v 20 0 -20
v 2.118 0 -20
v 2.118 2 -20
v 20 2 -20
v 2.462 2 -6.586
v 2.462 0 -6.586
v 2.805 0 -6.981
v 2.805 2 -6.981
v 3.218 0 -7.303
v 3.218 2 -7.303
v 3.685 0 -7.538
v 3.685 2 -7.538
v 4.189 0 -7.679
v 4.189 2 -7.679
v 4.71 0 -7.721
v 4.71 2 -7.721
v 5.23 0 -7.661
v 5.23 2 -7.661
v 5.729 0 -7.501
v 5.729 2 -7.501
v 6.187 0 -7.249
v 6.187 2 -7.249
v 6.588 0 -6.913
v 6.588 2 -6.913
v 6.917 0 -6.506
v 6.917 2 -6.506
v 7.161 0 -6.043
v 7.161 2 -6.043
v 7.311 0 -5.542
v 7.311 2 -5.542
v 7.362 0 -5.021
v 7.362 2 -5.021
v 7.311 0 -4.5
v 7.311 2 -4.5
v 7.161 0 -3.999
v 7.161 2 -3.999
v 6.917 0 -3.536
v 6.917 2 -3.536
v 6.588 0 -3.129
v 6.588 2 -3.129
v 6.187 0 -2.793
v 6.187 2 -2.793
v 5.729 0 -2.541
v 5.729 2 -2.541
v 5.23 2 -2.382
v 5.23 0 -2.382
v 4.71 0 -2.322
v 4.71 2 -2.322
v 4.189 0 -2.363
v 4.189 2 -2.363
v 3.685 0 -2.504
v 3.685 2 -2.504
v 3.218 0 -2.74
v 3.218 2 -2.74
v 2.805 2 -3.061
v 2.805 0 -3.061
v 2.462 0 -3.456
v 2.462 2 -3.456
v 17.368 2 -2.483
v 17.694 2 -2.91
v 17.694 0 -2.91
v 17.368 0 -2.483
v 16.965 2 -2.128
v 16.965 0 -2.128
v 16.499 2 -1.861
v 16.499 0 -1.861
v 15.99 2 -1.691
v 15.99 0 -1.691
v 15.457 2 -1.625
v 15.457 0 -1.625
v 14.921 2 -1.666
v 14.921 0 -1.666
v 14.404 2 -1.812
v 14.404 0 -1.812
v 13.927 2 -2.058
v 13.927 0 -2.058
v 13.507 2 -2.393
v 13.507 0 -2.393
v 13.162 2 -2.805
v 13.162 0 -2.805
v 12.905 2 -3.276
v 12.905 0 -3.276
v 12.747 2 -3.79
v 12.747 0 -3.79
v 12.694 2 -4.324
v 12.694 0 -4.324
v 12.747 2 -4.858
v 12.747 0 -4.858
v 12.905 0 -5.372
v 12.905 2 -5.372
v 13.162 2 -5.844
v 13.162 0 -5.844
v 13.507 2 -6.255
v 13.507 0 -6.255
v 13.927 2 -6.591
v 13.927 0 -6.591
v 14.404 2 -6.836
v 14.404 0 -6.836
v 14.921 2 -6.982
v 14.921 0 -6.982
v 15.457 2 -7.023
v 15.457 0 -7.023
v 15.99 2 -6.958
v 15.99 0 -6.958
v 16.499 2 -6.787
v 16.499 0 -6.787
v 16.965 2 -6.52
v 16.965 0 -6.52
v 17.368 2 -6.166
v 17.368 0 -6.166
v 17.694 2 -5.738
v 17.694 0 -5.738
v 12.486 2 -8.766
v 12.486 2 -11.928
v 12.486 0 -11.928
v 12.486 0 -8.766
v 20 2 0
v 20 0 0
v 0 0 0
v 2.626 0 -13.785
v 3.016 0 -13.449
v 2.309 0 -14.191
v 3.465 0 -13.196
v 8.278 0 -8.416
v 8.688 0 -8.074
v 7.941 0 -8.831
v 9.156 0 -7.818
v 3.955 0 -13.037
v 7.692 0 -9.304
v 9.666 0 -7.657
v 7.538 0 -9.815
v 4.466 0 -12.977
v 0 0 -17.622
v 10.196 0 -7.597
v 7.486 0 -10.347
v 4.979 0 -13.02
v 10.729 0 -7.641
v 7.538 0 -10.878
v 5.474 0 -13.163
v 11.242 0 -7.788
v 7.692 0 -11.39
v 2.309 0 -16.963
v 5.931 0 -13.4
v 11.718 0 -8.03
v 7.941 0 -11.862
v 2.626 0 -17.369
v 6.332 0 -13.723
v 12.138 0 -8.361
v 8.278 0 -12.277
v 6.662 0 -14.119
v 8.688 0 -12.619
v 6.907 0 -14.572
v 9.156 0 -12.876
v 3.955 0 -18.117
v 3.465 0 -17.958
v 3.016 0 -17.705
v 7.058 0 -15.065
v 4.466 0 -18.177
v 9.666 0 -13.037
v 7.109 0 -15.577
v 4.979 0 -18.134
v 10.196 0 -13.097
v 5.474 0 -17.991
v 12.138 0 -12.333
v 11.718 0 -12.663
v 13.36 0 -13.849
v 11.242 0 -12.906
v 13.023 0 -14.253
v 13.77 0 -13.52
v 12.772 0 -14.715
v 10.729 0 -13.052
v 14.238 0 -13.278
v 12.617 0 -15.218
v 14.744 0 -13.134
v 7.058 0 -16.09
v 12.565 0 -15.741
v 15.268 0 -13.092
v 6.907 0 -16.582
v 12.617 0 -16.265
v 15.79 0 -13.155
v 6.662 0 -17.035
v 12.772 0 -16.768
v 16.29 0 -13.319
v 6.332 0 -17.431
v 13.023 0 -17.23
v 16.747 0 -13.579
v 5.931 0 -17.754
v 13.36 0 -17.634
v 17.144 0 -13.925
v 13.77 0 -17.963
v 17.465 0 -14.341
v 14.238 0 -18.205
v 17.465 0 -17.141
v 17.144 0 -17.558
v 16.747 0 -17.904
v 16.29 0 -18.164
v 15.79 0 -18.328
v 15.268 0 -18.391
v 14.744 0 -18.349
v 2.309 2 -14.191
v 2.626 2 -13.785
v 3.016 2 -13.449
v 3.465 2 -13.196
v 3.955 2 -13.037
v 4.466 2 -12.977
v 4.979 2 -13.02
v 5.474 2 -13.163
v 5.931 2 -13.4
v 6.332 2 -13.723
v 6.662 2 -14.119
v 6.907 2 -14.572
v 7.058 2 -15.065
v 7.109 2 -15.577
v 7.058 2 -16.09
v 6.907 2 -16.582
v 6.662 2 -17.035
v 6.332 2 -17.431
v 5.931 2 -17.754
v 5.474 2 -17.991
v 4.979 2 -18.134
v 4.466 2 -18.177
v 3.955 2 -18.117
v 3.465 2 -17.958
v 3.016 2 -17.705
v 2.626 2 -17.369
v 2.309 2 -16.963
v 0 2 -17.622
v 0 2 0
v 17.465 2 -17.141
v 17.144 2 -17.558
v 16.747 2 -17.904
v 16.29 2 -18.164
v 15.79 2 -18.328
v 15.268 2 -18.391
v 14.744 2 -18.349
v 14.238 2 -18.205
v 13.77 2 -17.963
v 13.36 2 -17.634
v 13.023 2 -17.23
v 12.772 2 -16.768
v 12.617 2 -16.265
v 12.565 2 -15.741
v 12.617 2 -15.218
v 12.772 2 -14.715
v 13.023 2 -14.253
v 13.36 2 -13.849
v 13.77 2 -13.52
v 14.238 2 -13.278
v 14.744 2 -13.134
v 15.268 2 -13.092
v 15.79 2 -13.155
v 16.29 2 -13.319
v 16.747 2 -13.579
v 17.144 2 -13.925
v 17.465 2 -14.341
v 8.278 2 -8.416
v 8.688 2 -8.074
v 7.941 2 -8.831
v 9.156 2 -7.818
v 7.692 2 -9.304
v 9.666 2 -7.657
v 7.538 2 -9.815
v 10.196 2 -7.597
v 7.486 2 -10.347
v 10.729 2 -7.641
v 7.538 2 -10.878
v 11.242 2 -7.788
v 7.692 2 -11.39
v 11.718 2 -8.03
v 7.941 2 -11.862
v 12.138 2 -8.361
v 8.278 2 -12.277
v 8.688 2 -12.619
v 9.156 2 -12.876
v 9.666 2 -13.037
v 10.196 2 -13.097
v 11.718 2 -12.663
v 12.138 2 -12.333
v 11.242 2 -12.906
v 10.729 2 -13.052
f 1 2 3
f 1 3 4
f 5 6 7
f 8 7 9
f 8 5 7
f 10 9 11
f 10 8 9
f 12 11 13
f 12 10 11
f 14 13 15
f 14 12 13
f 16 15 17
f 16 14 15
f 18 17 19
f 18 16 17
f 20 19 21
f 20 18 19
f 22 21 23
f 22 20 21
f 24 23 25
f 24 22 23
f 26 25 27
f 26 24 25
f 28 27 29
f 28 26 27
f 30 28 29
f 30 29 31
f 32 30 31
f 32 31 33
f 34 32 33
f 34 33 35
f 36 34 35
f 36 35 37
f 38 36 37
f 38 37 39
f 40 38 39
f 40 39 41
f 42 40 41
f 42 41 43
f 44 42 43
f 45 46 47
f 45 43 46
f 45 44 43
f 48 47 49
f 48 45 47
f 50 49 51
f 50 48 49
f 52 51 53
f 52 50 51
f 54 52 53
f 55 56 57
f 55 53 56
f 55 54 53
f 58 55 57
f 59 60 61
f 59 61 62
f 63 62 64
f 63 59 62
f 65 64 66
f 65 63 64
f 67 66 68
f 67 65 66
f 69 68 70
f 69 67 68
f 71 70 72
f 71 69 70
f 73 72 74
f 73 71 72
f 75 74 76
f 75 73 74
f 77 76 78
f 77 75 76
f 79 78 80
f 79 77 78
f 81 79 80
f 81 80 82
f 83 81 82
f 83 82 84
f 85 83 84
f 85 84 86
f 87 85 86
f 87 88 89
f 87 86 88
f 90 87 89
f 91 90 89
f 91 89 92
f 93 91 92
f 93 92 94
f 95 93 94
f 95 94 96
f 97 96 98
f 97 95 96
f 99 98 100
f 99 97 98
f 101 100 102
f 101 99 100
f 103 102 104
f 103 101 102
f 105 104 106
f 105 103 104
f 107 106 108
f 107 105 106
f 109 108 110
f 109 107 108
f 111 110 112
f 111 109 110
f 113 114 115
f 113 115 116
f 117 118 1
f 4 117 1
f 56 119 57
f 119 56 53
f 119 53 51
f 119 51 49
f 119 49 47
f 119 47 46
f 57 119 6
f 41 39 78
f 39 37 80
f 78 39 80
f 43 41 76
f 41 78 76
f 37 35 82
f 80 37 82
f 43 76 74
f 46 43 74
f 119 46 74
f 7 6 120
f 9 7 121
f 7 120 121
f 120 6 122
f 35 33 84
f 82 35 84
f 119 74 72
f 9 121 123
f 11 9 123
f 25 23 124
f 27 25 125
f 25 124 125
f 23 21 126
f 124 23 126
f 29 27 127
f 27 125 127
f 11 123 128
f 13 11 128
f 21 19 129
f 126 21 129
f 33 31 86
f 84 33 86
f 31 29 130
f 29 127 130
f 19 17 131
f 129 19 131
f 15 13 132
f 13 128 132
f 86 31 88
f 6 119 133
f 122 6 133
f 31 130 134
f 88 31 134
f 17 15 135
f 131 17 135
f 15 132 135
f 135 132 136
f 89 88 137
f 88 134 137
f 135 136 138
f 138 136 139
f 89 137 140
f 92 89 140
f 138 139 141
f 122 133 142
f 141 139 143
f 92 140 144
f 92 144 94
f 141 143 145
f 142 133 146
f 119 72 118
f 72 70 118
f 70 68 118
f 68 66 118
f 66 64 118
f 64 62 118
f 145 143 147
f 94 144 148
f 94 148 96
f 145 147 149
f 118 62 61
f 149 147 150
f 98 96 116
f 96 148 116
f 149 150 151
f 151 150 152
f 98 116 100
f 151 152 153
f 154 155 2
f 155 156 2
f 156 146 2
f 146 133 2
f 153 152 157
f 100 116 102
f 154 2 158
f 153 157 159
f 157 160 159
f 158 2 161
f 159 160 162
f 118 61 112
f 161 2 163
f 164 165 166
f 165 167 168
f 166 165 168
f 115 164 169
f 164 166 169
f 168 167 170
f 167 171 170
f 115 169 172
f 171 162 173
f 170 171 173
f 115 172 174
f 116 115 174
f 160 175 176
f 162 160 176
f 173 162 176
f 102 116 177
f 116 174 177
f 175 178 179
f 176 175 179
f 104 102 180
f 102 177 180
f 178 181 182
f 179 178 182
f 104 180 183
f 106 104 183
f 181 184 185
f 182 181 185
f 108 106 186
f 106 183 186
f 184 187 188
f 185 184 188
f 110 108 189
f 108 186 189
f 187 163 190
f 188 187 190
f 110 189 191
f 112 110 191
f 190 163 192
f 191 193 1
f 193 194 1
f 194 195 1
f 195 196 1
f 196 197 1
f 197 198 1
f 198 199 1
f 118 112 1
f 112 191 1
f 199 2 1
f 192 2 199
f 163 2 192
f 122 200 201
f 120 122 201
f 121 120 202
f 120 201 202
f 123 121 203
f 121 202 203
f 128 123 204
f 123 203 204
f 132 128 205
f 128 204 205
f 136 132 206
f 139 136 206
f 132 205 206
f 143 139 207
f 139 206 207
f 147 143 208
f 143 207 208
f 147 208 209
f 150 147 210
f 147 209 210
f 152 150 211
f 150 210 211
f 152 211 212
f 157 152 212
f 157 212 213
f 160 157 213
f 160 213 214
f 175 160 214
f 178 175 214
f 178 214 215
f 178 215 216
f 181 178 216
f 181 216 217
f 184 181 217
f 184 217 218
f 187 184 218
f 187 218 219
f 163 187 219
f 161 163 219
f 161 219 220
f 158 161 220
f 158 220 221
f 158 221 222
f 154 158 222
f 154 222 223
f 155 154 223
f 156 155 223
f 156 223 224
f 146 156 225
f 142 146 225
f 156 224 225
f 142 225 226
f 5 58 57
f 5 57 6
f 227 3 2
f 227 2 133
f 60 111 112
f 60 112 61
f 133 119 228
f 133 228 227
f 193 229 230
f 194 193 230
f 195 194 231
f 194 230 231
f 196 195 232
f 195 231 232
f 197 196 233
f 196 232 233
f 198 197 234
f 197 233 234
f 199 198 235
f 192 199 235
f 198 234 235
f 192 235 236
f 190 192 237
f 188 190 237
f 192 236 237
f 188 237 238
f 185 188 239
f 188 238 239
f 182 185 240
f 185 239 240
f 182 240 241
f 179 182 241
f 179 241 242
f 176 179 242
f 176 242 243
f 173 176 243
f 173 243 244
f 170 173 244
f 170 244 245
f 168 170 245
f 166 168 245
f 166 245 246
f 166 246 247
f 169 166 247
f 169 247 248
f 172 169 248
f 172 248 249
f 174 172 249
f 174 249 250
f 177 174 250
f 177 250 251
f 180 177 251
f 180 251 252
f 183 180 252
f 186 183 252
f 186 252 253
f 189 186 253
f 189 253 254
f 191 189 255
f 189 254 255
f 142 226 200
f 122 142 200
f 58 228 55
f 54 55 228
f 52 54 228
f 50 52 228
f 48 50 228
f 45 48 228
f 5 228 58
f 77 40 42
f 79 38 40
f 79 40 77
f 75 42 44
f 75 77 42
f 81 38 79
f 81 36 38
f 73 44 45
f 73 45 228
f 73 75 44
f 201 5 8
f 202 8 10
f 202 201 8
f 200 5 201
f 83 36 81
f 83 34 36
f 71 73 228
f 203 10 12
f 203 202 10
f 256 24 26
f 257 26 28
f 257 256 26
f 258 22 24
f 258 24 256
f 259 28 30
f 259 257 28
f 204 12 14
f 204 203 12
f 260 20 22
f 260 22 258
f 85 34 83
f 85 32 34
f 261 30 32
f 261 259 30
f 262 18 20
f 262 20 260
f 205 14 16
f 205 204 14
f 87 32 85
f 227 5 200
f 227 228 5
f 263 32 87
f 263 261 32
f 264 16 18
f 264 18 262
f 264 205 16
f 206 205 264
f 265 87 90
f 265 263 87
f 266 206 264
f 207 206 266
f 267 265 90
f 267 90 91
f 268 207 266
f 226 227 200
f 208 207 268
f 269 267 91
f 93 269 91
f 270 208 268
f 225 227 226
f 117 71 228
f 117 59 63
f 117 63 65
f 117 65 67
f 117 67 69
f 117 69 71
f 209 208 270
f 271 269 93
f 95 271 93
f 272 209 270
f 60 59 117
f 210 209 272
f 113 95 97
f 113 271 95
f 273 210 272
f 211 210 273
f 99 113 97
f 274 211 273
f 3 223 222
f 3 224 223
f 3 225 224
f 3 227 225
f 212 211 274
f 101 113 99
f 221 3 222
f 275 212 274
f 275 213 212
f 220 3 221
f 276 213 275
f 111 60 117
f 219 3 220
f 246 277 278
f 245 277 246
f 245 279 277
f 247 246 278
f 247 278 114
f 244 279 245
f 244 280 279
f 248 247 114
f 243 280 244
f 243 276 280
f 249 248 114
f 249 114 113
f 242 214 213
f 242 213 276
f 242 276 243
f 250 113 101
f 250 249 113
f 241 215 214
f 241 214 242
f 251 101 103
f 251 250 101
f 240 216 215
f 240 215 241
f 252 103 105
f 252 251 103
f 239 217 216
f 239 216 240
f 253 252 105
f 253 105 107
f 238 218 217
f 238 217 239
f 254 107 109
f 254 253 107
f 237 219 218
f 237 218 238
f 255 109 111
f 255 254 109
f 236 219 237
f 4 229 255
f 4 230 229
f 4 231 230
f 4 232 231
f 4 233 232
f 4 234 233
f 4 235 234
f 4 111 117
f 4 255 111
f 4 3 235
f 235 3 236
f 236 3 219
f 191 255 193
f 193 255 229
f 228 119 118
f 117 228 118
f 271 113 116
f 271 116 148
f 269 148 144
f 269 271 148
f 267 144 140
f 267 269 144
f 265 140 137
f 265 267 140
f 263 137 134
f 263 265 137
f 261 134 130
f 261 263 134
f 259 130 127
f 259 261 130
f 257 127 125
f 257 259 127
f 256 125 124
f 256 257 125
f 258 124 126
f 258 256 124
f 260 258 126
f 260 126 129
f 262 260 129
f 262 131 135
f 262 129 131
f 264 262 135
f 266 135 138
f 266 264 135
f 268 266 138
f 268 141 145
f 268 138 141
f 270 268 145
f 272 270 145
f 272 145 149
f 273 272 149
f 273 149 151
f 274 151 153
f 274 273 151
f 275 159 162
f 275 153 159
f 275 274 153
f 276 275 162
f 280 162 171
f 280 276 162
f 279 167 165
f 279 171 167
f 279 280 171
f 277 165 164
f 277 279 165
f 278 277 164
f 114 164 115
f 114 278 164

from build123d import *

# Parameters (mm, degrees)
ESBO_O1_W                = 20
ESBO_O1_H                = 20
RESSALTO_EXTRUS_O3_DEPTH = 2
CORTE_EXTRUS_O5_DEPTH    = 29.354893758


with BuildPart() as part:
    # Esboço1 → Ressalto-extrusão3 (new body)
    with BuildSketch(Plane(origin=(0, 0, 0), x_dir=(1, 0, 0), z_dir=(0, 1, 0))):
        with Locations((10, 10)):
            Rectangle(ESBO_O1_W, ESBO_O1_H)
    extrude(amount=RESSALTO_EXTRUS_O3_DEPTH)

    # Esboço5 → Corte-extrusão5 (cut, through all)
    with BuildSketch(Plane(origin=(0, 2, 0), x_dir=(1, 0, 0), z_dir=(0, 1, 0))):
        with BuildLine():
            Line((2.309294959, 16.962694399), (2.309294959, 14.191413107))
            ThreePointArc((2.309294959, 14.191413107), (7.109294959, 15.577053753), (2.309294959, 16.962694399))
        make_face()
        with BuildLine():
            Line((2.461667221, 3.455973937), (2.461667221, 6.586469106))
            ThreePointArc((2.461667221, 6.586469106), (7.361667221, 5.021221521), (2.461667221, 3.455973937))
        make_face()
        with BuildLine():
            Line((17.465138281, 14.341379407), (17.465138281, 17.141379407))
            ThreePointArc((17.465138281, 17.141379407), (12.565138281, 15.741379407), (17.465138281, 14.341379407))
        make_face()
        with BuildLine():
            Line((12.486102937, 11.927996301), (12.486102937, 8.765718641))
            ThreePointArc((12.486102937, 8.765718641), (7.486102937, 10.346857471), (12.486102937, 11.927996301))
        make_face()
        with BuildLine():
            Line((17.693873019, 5.738268613), (17.693873019, 2.909841488))
            ThreePointArc((17.693873019, 2.909841488), (12.693873019, 4.32405505), (17.693873019, 5.738268613))
        make_face()
        Polygon((3.125021592, 21.130122811), (-1.51392015, 15.923072084), (-4.183814677, 19.828549229), (-3.382846319, 21.73084908), align=None)
    extrude(amount=-CORTE_EXTRUS_O5_DEPTH, mode=Mode.SUBTRACT)


solid = part.part
